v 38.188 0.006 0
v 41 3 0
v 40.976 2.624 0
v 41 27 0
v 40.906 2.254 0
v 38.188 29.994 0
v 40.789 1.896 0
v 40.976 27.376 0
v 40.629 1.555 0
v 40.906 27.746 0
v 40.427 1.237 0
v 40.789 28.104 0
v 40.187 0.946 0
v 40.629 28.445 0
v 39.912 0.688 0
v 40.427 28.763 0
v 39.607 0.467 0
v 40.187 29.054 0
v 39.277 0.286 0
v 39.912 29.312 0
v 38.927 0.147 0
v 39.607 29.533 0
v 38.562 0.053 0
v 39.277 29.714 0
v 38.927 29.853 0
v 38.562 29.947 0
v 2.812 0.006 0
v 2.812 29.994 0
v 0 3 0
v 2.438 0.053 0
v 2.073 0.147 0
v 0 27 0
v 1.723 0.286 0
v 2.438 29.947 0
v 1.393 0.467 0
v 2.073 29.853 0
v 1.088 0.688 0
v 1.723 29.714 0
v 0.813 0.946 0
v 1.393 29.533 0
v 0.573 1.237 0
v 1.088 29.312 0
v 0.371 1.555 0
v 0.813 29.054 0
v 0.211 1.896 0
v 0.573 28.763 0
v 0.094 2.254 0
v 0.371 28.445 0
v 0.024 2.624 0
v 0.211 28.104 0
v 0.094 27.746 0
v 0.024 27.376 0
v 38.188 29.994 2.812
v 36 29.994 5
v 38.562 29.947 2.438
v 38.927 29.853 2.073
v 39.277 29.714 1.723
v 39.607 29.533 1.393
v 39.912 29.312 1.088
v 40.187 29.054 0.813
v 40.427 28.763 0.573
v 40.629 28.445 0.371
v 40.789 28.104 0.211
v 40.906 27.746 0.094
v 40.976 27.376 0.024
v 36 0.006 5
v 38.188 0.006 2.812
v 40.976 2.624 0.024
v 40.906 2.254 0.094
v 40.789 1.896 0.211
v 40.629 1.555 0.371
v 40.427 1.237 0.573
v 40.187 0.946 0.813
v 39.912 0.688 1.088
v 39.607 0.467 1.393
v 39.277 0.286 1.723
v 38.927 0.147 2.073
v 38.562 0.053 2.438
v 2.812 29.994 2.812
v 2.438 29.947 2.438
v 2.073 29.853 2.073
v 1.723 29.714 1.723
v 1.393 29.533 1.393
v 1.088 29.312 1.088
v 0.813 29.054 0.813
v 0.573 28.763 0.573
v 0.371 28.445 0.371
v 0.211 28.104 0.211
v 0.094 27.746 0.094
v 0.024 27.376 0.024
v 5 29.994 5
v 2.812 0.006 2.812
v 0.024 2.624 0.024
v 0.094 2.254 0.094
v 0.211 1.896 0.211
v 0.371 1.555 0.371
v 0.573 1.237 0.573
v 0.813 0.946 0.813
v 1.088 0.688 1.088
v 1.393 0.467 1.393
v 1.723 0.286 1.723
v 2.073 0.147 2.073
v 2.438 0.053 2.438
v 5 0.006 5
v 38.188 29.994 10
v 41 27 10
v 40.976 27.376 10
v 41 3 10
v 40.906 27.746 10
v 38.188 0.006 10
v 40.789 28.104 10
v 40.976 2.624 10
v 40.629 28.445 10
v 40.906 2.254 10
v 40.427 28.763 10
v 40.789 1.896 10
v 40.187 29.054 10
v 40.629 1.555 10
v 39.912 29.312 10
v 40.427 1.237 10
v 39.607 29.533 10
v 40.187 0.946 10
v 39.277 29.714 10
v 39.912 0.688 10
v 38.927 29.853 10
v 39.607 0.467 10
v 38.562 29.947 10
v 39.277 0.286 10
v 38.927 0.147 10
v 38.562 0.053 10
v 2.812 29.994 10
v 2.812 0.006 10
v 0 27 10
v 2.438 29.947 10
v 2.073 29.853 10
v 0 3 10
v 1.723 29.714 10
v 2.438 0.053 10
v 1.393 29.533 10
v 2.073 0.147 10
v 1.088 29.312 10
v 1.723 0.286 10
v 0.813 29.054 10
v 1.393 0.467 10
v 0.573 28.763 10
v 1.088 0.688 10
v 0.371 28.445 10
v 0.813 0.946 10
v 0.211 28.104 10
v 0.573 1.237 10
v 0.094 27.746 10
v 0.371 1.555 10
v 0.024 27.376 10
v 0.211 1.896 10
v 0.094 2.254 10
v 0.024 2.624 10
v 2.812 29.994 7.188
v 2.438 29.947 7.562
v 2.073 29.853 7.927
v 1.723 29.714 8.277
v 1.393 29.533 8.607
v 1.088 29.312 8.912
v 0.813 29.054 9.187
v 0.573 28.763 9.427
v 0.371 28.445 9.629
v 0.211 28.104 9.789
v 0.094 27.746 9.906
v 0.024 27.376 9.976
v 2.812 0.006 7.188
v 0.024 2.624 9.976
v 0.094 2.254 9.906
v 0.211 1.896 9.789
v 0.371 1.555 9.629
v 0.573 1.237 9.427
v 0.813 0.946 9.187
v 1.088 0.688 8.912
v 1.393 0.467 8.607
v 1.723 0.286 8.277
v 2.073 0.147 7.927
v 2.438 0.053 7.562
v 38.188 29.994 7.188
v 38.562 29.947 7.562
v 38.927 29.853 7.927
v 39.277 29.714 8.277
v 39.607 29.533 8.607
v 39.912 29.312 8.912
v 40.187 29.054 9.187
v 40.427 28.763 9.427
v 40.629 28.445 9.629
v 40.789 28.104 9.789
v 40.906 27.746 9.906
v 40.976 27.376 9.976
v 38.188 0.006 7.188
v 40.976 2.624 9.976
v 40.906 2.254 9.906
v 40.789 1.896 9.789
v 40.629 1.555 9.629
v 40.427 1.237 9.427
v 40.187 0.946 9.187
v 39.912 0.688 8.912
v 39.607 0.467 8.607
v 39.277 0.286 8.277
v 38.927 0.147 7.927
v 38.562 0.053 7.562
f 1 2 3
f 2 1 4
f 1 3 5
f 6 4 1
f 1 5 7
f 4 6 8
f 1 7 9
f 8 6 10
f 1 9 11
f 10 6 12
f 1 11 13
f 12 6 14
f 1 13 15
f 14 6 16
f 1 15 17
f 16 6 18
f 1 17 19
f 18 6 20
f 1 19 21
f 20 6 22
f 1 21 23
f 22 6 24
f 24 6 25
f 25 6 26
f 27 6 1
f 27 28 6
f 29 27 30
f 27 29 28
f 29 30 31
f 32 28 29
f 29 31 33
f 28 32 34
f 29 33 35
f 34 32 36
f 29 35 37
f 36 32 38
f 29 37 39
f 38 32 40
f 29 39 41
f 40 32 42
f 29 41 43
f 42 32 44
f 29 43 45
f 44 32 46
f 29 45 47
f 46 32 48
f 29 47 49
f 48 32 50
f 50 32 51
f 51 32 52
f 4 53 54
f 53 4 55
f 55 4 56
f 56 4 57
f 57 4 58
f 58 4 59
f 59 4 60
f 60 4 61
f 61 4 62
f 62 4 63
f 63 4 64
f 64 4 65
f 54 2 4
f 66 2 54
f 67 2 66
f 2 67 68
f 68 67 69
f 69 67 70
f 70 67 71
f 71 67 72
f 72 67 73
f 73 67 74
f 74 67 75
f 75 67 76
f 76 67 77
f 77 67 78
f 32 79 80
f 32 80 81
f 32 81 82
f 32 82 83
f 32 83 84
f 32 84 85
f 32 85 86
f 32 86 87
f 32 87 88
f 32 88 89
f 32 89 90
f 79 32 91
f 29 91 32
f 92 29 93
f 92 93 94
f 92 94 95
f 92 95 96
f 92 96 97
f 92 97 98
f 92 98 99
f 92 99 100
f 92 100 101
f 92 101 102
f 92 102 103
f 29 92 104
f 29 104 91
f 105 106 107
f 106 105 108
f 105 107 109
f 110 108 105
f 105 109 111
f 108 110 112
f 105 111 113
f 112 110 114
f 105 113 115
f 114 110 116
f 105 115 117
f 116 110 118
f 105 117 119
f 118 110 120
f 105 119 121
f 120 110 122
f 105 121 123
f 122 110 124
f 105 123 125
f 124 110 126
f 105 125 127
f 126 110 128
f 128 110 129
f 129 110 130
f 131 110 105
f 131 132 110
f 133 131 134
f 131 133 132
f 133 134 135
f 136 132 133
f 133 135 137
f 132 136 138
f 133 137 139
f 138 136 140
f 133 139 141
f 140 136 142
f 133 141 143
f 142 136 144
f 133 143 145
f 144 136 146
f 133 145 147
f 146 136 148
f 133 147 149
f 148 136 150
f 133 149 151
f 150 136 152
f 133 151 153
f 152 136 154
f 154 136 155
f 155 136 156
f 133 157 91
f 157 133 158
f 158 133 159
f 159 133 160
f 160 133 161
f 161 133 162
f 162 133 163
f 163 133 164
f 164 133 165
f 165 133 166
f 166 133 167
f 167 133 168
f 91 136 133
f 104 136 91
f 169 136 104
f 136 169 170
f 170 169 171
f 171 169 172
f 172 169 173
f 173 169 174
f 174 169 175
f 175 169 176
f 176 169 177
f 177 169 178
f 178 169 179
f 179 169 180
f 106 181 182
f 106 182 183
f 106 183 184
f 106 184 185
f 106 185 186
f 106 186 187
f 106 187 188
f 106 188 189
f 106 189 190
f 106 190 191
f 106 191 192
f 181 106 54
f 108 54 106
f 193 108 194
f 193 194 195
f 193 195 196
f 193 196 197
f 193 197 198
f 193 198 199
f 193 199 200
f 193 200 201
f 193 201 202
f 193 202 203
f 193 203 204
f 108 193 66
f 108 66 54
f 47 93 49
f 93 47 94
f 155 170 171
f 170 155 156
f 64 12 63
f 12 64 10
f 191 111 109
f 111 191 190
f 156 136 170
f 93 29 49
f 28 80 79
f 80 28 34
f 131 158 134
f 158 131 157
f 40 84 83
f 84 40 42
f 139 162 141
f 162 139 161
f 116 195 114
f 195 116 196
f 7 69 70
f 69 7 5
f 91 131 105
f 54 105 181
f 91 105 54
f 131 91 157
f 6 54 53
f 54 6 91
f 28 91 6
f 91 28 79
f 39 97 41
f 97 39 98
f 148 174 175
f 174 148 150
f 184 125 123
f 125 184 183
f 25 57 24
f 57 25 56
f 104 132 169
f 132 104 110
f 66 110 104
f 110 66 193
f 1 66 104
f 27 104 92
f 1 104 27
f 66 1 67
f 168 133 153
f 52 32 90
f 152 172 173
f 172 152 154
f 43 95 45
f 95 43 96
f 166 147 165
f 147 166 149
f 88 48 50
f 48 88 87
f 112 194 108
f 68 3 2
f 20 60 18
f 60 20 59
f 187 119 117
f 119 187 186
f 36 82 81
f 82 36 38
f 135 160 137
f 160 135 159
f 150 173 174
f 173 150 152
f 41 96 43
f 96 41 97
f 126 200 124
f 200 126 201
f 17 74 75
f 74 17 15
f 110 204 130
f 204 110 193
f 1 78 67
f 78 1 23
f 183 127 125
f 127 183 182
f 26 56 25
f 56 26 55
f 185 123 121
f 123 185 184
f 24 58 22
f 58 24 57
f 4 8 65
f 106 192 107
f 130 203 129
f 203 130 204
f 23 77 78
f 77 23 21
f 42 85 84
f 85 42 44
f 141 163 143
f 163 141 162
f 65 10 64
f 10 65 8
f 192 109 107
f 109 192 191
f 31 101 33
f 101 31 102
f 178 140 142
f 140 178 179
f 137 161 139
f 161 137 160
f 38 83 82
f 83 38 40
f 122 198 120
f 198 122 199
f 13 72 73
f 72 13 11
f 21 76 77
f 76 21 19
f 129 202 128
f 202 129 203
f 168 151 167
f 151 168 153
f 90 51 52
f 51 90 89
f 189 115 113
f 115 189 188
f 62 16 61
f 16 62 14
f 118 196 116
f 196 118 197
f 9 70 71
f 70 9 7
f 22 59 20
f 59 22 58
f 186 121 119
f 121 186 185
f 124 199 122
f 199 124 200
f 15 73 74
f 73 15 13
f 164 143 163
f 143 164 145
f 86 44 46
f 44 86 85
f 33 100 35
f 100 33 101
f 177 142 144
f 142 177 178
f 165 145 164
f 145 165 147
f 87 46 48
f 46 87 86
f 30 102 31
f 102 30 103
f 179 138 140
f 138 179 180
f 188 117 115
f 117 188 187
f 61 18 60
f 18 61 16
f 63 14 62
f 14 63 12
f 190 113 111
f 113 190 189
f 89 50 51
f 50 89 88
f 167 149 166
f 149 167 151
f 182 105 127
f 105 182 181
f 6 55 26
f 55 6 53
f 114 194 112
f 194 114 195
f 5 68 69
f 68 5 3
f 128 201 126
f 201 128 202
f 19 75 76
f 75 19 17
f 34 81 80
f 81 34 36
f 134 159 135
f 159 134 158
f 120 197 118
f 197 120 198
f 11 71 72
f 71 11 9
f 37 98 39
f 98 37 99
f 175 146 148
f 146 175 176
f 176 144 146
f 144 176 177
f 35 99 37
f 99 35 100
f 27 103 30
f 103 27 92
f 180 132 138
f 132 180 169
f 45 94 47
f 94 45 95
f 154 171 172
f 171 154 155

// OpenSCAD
$fn=50;

fudge = 1;    // Used to oversize some shapes being subtracted to help make things look better
width = 41;   // Specs suggest 38mm is the width, as do measurements,
              // but when I printed at 38mm it came out too narrow to be gripped..


module double_arca_plate(l=40,h=10)
{
    union()
    {
        single_arca_plate(l,h/2);
        translate([width,0,h])
            rotate([0,180,0])
                single_arca_plate(l,h/2);
    }
}

module single_arca_plate(l=40,h=5)
{
    polyhedron(points=[
               [0,0,0],[0,l,0],[width,l,0],[width,0,0],
               [h,0,h],[h,l,h],[width-h,l,h],[width-h,0,h]
       ], faces=[ // points for all faces must be ordered clockwise when looking in
               [3,2,1,0],  // base face
               [4,5,6,7],  // top face
               [0,1,5,4],  // side face
               [2,3,7,6],  // side face
               [0,4,7,3],  // near end
               [2,6,5,1],  // far end
       ]);
}

//single_arca_plate();
intersection()
{
    double_arca_plate(30,10);
    roundedRect([width,30,10], 3);
}

//Draw a prism based on a 
//right angled triangle
//l - length of prism
//w - width of triangle
//h - height of triangle
module prism(l, w, h) {
       polyhedron(points=[
               [0,0,h],           // 0    front top corner
               [0,0,0],[w,0,0],   // 1, 2 front left & right bottom corners
               [0,l,h],           // 3    back top corner
               [0,l,0],[w,l,0]    // 4, 5 back left & right bottom corners
       ], faces=[ // points for all faces must be ordered clockwise when looking in
               [0,2,1],    // top face
               [3,4,5],    // base face
               [0,1,4,3],  // h face
               [1,2,5,4],  // w face
               [0,3,5,2],  // hypotenuse face
       ]);
}

module roundedRect(size, radius)
{
    x = size[0];
    y = size[1];
    z = size[2];
    linear_extrude(height=z)
    hull()
    {
        // place 4 circles in the corners, with the given radius
        translate([radius, radius, 0])
            circle(r=radius);
        translate([x-radius, radius, 0])
            circle(r=radius);
        translate([radius, y-radius, 0])
            circle(r=radius);
        translate([x-radius, y-radius, 0])
            circle(r=radius);
    }
}
